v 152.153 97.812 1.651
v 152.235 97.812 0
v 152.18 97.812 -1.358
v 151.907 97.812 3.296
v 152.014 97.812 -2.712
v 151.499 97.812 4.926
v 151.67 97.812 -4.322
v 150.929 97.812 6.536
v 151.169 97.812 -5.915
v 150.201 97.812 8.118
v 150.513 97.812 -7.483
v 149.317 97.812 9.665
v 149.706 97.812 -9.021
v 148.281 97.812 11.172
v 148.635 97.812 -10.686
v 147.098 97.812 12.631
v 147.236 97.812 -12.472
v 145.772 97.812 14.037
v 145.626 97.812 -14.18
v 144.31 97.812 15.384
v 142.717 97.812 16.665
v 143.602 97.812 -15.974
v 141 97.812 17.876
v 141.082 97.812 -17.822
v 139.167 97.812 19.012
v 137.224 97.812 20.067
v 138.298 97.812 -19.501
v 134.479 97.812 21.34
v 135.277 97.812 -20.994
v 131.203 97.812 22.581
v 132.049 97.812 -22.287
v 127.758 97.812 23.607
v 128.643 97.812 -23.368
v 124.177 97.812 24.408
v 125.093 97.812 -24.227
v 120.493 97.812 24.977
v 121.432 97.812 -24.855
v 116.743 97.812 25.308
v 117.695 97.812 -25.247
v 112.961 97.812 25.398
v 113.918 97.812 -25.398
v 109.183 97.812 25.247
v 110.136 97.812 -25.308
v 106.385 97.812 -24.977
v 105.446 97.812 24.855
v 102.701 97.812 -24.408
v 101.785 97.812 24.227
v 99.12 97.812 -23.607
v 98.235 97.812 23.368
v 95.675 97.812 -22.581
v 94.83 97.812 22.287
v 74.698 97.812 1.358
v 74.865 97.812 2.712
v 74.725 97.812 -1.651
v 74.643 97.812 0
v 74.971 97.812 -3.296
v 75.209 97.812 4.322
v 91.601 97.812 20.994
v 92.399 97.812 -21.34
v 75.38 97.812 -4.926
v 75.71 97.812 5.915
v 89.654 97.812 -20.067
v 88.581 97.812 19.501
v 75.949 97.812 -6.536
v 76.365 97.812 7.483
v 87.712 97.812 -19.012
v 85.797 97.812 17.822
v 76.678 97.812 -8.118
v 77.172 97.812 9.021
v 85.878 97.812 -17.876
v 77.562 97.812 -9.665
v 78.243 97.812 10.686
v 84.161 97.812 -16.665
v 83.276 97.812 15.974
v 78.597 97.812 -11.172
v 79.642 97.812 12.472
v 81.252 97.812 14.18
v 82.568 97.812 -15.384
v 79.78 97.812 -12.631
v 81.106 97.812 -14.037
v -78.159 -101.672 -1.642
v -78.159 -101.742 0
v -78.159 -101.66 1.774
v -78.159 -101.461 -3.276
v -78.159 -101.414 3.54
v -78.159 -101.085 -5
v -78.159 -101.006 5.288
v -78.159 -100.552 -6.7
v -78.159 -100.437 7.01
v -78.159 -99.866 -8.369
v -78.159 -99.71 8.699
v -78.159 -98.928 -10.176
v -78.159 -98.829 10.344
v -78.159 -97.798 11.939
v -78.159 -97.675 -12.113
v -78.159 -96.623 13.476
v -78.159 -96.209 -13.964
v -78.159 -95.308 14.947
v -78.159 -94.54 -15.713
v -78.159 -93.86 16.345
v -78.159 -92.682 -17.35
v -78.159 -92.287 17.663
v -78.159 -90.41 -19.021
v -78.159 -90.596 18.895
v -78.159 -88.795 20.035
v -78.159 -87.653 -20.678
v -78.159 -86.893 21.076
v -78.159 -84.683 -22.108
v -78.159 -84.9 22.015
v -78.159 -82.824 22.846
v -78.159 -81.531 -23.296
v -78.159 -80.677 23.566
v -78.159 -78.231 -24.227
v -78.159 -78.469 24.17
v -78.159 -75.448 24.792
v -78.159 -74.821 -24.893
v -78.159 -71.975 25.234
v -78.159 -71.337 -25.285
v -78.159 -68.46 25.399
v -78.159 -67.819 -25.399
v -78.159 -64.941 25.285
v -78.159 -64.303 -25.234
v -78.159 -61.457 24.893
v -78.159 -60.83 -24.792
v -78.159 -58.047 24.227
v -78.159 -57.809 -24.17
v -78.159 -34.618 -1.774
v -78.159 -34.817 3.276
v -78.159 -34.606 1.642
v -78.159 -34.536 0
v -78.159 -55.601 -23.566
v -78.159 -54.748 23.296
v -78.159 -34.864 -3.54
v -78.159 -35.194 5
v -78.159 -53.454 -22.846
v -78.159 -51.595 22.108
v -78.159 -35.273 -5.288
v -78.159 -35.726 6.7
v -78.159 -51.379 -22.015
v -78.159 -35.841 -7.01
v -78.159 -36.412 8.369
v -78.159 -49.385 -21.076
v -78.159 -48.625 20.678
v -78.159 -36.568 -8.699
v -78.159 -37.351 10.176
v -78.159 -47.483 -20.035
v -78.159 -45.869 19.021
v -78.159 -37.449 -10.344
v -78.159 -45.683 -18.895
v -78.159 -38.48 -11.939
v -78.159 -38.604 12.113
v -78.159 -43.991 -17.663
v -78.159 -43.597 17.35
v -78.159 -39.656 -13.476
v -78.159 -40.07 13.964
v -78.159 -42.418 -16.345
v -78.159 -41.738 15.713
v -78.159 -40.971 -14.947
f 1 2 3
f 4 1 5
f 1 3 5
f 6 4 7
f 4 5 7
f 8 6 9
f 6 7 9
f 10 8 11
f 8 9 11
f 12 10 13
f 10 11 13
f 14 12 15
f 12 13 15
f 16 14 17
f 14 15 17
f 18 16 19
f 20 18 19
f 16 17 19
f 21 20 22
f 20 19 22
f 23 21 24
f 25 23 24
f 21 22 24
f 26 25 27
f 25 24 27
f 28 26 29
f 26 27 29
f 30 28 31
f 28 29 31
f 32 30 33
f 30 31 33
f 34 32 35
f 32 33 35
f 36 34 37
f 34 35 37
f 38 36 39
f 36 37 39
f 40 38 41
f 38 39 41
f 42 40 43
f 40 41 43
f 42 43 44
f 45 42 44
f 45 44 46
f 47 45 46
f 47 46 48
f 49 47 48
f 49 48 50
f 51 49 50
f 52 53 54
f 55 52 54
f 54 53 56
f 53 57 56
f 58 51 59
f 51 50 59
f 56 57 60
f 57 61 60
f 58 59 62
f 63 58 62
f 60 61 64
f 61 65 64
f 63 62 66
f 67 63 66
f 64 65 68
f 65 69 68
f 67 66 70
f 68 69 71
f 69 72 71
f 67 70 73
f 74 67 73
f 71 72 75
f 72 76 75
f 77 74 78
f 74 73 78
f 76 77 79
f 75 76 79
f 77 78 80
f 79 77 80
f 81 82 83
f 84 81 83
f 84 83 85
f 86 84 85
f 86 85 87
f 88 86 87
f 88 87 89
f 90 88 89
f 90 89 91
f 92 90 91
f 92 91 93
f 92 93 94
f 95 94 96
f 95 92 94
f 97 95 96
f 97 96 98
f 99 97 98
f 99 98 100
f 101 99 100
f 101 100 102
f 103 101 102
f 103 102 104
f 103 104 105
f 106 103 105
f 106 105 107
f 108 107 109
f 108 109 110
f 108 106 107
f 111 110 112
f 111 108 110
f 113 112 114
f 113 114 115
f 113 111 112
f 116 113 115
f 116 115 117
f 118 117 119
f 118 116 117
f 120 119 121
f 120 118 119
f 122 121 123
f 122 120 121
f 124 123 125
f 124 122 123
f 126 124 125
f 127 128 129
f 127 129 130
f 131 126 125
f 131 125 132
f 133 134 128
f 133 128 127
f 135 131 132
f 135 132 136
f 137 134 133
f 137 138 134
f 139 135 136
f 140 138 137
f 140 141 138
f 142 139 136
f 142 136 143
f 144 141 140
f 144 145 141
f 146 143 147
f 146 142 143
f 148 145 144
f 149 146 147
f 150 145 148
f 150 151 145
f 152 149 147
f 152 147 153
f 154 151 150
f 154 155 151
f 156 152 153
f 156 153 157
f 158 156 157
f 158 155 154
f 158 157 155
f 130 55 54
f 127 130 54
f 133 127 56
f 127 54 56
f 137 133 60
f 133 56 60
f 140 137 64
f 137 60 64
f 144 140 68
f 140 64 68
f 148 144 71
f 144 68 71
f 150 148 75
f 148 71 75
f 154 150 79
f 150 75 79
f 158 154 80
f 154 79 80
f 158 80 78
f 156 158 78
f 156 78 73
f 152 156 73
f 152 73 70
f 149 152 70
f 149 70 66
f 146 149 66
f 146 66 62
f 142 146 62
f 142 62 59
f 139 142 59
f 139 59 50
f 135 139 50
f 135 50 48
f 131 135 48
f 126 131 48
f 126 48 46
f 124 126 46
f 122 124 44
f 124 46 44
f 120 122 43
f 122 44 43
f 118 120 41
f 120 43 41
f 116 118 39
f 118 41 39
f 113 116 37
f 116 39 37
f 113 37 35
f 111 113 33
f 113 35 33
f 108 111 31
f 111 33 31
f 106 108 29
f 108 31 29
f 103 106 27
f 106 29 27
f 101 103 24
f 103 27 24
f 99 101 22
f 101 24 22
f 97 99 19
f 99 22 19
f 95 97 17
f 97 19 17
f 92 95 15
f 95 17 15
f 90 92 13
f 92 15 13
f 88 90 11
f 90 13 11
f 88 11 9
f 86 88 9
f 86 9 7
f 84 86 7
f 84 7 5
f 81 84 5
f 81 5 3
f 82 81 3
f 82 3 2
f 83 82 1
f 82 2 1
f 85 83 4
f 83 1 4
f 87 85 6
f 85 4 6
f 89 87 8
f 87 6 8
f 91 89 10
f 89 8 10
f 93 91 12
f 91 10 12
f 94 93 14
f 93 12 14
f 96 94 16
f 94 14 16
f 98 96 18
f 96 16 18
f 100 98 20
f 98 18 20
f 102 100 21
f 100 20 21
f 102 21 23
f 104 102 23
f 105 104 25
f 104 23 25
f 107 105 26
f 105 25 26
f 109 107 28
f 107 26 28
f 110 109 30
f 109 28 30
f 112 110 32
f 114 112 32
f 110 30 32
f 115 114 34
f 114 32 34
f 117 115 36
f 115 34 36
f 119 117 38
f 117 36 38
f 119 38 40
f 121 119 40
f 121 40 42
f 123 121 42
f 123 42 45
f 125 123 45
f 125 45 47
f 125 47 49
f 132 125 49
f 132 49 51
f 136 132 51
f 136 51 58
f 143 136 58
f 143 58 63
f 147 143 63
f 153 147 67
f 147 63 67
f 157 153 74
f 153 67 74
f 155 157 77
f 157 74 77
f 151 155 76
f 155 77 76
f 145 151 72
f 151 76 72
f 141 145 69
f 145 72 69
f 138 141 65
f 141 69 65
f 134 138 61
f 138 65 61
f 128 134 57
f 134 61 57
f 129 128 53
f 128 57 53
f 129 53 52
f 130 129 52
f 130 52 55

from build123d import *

# Parameters (mm, degrees)
CUT_EXTRUDE1_DEPTH      = 206.849628346
CUT_EXTRUDE1_DEPTH_BACK = 206.849628346
CUT_EXTRUDE2_DEPTH      = 185.85731066
CUT_EXTRUDE2_DEPTH_BACK = 185.85731066


with BuildPart() as part:
    # Sketch1 → Revolve-Thin1 (revolve)
    with BuildSketch(Plane.XY, mode=Mode.PRIVATE) as revolve_thin1_sk:
        Polygon((135.605846103, 117.01106453), (-94.788032894, -82.542688932), (-78.158553439, -101.742178848), (152.235325558, 97.811574614), align=None)
    revolve(revolve_thin1_sk.sketch.rotate(Axis((135.605846103, 117.01106453, 0), (-0.7558854297800033, -0.6547039155574831, 0)), 180), axis=Axis((135.605846103, 117.01106453, 0), (-0.7558854297800033, -0.6547039155574831, 0)))

    # Sketch2 → Cut-Extrude1 (cut, two sides: drawn at the far end of the back side and taken through both)
    with BuildSketch(Plane.XY.offset(-CUT_EXTRUDE1_DEPTH_BACK)):
        Polygon((180.039707564, 97.811574614), (7.480130989, 97.811574614), (101.41164362, 186.9937411), align=None)
    extrude(amount=CUT_EXTRUDE1_DEPTH + CUT_EXTRUDE1_DEPTH_BACK, mode=Mode.SUBTRACT)

    # Sketch3 → Cut-Extrude2 (cut, two sides: drawn at the far end of the back side and taken through both)
    with BuildSketch(Plane.XY.offset(-CUT_EXTRUDE2_DEPTH_BACK)):
        Polygon((-78.158553439, -101.742178848), (-78.158553439, 0), (-164.424224952, -9.260462321), (-121.291389196, -114.506813698), align=None)
    extrude(amount=CUT_EXTRUDE2_DEPTH + CUT_EXTRUDE2_DEPTH_BACK, mode=Mode.SUBTRACT)


solid = part.part
